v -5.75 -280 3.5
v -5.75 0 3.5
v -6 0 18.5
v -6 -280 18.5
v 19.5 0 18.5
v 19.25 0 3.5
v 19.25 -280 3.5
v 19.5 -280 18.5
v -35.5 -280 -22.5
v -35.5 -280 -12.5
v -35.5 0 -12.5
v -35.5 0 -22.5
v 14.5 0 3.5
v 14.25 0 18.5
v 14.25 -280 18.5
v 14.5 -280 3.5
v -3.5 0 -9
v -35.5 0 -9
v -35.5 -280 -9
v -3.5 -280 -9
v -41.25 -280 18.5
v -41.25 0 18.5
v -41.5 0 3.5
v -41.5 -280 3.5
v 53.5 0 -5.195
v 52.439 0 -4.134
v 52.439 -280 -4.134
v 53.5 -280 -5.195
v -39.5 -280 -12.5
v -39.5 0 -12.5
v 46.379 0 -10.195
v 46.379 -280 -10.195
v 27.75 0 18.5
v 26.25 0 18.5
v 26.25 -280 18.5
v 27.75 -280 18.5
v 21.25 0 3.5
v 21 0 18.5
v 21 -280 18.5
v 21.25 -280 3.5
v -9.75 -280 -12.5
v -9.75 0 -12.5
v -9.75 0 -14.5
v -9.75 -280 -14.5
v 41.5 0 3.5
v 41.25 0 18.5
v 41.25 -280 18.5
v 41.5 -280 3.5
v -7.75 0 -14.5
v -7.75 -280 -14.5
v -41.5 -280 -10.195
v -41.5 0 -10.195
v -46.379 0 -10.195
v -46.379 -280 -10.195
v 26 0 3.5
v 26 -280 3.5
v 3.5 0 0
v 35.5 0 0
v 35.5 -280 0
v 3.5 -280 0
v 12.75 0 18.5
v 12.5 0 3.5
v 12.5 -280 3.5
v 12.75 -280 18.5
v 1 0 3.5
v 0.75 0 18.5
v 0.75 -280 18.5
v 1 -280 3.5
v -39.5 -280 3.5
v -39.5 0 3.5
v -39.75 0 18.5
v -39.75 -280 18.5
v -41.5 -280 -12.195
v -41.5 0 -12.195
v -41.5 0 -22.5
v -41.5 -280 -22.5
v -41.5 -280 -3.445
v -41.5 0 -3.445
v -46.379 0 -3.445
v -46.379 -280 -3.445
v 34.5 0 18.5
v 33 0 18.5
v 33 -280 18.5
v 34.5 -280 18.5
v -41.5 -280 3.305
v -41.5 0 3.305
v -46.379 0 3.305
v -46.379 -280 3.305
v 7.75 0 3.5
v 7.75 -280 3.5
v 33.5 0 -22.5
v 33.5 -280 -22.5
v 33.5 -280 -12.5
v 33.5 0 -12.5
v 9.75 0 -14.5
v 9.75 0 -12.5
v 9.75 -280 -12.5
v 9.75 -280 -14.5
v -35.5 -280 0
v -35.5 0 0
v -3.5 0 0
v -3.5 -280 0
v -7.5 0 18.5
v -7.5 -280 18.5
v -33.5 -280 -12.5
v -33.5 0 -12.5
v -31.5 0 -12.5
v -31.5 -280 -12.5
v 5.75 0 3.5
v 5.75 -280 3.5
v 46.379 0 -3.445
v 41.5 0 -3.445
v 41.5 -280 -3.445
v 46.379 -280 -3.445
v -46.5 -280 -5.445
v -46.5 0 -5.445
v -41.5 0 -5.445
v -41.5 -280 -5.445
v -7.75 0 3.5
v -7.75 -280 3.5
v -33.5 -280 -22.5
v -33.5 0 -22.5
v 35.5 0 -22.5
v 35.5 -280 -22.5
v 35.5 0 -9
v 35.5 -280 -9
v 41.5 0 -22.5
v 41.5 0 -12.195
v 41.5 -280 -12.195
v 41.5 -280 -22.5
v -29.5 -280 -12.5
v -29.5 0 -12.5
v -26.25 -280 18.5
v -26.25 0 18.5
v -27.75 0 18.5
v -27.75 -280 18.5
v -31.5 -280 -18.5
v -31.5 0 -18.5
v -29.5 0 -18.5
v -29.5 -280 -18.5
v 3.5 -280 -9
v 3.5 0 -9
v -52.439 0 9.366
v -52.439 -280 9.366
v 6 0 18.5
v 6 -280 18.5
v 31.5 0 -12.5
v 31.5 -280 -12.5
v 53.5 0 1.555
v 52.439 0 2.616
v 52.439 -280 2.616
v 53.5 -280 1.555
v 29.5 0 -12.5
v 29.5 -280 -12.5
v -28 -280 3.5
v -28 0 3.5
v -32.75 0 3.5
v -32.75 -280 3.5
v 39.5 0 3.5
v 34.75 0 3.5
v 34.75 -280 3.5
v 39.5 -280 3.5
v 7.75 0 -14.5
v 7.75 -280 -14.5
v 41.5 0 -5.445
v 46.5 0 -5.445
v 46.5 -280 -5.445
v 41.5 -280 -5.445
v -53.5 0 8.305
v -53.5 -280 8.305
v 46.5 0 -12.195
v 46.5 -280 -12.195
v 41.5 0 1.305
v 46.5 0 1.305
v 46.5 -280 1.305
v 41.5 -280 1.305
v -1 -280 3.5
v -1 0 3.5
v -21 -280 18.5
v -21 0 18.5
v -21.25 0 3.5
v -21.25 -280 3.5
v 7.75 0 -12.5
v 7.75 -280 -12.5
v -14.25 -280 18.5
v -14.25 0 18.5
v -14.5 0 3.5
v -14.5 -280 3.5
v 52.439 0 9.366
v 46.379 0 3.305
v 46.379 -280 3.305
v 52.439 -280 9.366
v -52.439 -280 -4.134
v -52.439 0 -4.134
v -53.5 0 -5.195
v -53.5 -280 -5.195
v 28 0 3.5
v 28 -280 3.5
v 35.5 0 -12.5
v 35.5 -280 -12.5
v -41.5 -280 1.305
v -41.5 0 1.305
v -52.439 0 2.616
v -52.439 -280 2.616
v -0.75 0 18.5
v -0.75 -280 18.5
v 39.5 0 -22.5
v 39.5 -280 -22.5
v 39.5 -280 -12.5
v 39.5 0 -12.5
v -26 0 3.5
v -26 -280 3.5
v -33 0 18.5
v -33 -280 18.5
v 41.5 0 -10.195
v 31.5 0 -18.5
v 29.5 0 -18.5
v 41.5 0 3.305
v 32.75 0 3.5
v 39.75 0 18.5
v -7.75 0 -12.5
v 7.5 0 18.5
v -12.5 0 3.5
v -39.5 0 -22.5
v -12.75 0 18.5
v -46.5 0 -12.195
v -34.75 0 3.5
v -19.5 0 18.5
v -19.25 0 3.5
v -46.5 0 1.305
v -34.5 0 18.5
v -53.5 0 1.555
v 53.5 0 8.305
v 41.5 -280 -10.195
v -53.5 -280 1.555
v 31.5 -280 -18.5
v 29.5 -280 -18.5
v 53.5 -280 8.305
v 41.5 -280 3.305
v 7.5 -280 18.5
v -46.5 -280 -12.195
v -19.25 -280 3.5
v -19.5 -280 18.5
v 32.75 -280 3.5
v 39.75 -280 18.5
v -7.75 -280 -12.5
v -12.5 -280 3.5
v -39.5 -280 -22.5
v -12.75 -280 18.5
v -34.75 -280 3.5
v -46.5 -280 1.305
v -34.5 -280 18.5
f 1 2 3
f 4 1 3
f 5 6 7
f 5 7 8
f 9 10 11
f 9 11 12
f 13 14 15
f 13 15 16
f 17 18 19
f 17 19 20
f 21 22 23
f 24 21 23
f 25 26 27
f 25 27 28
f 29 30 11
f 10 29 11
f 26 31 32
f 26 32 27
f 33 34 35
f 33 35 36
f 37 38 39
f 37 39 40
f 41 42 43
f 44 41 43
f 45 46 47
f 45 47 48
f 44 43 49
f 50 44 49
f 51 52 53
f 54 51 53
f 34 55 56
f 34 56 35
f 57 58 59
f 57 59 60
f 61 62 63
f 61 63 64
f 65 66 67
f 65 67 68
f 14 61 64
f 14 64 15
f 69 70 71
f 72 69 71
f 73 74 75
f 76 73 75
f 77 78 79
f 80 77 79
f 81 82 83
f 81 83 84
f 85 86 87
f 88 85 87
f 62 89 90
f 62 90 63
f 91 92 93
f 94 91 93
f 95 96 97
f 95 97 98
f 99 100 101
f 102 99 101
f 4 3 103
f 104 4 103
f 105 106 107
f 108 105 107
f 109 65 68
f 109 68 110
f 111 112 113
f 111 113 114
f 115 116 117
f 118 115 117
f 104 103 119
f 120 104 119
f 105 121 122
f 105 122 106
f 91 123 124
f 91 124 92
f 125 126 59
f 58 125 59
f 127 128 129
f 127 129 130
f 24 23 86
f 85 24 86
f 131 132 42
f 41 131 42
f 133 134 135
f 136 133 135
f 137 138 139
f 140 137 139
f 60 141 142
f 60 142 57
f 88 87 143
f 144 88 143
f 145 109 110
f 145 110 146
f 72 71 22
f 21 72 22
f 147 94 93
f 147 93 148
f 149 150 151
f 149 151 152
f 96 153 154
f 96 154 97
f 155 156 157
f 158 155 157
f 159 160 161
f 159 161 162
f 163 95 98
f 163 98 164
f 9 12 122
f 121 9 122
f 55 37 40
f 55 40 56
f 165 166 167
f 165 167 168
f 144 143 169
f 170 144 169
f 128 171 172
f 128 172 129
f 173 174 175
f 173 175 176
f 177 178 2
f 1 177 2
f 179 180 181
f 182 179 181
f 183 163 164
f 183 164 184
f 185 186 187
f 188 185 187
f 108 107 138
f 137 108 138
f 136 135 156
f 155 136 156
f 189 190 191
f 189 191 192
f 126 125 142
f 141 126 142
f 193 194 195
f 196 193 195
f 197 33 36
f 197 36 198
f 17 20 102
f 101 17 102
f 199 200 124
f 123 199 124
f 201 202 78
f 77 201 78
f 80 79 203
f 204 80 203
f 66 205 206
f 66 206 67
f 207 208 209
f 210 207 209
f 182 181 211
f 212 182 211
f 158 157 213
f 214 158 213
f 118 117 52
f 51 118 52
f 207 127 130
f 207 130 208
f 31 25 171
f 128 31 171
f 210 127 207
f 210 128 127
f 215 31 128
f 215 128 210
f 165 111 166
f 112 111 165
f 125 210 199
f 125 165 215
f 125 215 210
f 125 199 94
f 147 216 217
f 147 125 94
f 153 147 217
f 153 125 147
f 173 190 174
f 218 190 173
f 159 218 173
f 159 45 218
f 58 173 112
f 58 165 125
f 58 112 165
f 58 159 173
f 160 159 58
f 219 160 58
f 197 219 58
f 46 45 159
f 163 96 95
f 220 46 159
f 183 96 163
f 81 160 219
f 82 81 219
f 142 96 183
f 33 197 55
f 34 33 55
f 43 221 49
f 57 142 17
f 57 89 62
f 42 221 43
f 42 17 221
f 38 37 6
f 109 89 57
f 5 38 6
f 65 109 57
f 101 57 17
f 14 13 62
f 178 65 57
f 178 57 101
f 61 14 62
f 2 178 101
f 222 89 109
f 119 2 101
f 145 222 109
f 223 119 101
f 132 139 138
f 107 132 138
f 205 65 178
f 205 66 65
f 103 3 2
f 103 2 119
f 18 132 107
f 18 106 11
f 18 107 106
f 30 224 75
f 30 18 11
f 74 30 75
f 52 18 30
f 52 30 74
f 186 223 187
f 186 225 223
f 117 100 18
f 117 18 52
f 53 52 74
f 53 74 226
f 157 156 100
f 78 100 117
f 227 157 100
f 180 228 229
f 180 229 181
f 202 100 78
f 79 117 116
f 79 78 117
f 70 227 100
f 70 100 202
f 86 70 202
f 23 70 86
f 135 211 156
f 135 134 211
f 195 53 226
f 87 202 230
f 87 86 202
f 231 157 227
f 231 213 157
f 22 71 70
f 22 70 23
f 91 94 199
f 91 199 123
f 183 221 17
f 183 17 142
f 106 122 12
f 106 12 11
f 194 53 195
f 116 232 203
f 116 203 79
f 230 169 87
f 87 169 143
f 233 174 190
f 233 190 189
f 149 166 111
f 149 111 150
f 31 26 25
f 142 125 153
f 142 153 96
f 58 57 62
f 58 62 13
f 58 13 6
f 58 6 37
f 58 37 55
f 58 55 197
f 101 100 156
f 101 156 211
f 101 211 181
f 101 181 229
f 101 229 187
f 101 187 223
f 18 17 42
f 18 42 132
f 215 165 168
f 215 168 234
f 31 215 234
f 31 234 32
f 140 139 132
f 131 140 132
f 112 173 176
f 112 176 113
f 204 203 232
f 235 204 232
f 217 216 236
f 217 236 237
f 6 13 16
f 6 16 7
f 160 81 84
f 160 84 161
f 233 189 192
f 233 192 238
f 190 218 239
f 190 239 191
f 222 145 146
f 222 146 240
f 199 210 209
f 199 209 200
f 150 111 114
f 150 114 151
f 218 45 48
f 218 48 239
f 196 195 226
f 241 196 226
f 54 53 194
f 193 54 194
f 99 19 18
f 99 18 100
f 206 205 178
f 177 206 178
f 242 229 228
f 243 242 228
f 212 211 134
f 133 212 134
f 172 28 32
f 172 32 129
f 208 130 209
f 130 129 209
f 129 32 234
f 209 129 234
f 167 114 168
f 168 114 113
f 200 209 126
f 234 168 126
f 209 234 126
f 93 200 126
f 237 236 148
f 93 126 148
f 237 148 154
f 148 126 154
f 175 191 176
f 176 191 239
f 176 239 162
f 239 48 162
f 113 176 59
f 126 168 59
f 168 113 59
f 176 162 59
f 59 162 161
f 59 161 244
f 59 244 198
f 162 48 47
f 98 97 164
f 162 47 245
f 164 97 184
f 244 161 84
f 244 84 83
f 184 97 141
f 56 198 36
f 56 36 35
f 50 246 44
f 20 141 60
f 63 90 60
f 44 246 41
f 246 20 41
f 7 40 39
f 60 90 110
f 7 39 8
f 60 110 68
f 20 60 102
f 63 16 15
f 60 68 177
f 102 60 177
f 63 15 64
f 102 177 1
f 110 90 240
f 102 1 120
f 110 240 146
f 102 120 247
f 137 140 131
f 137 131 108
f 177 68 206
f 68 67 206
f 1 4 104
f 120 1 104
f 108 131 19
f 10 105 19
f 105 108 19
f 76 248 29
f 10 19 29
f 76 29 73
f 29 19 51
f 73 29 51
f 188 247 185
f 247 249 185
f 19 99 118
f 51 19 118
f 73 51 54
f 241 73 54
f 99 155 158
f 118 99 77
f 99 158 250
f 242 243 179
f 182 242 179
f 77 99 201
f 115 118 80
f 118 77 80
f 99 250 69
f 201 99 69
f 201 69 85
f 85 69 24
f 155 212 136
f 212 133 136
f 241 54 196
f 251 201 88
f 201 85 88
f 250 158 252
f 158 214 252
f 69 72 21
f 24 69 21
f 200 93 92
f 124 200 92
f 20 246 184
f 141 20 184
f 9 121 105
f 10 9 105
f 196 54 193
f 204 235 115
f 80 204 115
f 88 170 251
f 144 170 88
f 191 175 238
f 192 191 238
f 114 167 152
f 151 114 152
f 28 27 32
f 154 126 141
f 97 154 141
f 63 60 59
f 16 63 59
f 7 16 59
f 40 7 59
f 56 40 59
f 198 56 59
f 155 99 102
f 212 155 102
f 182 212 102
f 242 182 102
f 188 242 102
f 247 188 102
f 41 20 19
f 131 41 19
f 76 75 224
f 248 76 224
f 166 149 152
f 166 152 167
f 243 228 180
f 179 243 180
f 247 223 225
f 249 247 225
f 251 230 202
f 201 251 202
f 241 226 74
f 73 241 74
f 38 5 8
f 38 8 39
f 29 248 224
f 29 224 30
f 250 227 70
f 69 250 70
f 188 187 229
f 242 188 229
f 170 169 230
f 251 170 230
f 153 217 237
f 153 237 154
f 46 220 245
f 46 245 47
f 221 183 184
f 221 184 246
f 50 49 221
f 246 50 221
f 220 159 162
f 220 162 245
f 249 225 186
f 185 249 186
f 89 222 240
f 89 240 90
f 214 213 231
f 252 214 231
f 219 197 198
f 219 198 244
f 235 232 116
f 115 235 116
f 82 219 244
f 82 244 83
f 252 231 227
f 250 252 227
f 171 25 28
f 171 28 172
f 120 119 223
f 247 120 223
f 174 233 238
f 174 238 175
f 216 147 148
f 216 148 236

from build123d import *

# Parameters (mm, degrees)
F0_W     = 32
F0_H     = 9
F1_DEPTH = 280
F3_DEPTH = 280


with BuildPart() as f1:
    # F0 (on Front) → F1 (new body)
    with BuildSketch(Plane.XZ):
        Polygon((-41.5, -22.5), (-39.5, -22.5), (-39.5, -12.5), (-35.5, -12.5), (-35.5, -22.5), (-33.5, -22.5), (-33.5, -12.5), (-31.5, -12.5), (-31.5, -18.5), (-29.5, -18.5), (-29.5, -12.5), (-9.75, -12.5), (-9.75, -14.5), (-7.75, -14.5), (-7.75, -12.5), (0, -12.5), (0, 18.5), (-0.75, 18.5), (-1.000473, 3.5), (-5.75, 3.5), (-5.999527, 18.5), (-7.499527, 18.5), (-7.75, 3.5), (-12.5, 3.5), (-12.749527, 18.5), (-14.249527, 18.5), (-14.5, 3.5), (-19.25, 3.5), (-19.499527, 18.5), (-20.999527, 18.5), (-21.25, 3.5), (-26, 3.5), (-26.249527, 18.5), (-27.749527, 18.5), (-28, 3.5), (-32.75, 3.5), (-32.999527, 18.5), (-34.499527, 18.5), (-34.75, 3.5), (-39.5, 3.5), (-39.749527, 18.5), (-41.249527, 18.5), (-41.5, 3.5), align=None)
        with Locations((-19.5, -4.5)):
            Rectangle(F0_W, F0_H, mode=Mode.SUBTRACT)
    extrude(amount=F1_DEPTH)

    # F2 (on Front) → F3 (join)
    with BuildSketch(Plane.XZ):
        Polygon((-46.5, -12.194781), (-41.5, -12.194781), (-41.5, -10.194781), (-46.37868, -10.194781), (-52.43934, -4.134121), (-53.5, -5.194781), align=None)
        Polygon((-53.5, 1.555219), (-46.5, -5.444781), (-41.5, -5.444781), (-41.5, -3.444781), (-46.37868, -3.444781), (-52.43934, 2.615879), align=None)
        Polygon((-53.5, 8.305219), (-46.5, 1.305219), (-41.5, 1.305219), (-41.5, 3.305219), (-46.37868, 3.305219), (-52.43934, 9.365879), align=None)
    extrude(amount=F3_DEPTH)

    # F4: F1 across face


with BuildPart() as f1_1:
    add(f1.part)
    add(f1.part.mirror(Plane(origin=(0, -140, 3), x_dir=(0, 1, 0), z_dir=(1, 0, 0))))


solid = f1_1.part
